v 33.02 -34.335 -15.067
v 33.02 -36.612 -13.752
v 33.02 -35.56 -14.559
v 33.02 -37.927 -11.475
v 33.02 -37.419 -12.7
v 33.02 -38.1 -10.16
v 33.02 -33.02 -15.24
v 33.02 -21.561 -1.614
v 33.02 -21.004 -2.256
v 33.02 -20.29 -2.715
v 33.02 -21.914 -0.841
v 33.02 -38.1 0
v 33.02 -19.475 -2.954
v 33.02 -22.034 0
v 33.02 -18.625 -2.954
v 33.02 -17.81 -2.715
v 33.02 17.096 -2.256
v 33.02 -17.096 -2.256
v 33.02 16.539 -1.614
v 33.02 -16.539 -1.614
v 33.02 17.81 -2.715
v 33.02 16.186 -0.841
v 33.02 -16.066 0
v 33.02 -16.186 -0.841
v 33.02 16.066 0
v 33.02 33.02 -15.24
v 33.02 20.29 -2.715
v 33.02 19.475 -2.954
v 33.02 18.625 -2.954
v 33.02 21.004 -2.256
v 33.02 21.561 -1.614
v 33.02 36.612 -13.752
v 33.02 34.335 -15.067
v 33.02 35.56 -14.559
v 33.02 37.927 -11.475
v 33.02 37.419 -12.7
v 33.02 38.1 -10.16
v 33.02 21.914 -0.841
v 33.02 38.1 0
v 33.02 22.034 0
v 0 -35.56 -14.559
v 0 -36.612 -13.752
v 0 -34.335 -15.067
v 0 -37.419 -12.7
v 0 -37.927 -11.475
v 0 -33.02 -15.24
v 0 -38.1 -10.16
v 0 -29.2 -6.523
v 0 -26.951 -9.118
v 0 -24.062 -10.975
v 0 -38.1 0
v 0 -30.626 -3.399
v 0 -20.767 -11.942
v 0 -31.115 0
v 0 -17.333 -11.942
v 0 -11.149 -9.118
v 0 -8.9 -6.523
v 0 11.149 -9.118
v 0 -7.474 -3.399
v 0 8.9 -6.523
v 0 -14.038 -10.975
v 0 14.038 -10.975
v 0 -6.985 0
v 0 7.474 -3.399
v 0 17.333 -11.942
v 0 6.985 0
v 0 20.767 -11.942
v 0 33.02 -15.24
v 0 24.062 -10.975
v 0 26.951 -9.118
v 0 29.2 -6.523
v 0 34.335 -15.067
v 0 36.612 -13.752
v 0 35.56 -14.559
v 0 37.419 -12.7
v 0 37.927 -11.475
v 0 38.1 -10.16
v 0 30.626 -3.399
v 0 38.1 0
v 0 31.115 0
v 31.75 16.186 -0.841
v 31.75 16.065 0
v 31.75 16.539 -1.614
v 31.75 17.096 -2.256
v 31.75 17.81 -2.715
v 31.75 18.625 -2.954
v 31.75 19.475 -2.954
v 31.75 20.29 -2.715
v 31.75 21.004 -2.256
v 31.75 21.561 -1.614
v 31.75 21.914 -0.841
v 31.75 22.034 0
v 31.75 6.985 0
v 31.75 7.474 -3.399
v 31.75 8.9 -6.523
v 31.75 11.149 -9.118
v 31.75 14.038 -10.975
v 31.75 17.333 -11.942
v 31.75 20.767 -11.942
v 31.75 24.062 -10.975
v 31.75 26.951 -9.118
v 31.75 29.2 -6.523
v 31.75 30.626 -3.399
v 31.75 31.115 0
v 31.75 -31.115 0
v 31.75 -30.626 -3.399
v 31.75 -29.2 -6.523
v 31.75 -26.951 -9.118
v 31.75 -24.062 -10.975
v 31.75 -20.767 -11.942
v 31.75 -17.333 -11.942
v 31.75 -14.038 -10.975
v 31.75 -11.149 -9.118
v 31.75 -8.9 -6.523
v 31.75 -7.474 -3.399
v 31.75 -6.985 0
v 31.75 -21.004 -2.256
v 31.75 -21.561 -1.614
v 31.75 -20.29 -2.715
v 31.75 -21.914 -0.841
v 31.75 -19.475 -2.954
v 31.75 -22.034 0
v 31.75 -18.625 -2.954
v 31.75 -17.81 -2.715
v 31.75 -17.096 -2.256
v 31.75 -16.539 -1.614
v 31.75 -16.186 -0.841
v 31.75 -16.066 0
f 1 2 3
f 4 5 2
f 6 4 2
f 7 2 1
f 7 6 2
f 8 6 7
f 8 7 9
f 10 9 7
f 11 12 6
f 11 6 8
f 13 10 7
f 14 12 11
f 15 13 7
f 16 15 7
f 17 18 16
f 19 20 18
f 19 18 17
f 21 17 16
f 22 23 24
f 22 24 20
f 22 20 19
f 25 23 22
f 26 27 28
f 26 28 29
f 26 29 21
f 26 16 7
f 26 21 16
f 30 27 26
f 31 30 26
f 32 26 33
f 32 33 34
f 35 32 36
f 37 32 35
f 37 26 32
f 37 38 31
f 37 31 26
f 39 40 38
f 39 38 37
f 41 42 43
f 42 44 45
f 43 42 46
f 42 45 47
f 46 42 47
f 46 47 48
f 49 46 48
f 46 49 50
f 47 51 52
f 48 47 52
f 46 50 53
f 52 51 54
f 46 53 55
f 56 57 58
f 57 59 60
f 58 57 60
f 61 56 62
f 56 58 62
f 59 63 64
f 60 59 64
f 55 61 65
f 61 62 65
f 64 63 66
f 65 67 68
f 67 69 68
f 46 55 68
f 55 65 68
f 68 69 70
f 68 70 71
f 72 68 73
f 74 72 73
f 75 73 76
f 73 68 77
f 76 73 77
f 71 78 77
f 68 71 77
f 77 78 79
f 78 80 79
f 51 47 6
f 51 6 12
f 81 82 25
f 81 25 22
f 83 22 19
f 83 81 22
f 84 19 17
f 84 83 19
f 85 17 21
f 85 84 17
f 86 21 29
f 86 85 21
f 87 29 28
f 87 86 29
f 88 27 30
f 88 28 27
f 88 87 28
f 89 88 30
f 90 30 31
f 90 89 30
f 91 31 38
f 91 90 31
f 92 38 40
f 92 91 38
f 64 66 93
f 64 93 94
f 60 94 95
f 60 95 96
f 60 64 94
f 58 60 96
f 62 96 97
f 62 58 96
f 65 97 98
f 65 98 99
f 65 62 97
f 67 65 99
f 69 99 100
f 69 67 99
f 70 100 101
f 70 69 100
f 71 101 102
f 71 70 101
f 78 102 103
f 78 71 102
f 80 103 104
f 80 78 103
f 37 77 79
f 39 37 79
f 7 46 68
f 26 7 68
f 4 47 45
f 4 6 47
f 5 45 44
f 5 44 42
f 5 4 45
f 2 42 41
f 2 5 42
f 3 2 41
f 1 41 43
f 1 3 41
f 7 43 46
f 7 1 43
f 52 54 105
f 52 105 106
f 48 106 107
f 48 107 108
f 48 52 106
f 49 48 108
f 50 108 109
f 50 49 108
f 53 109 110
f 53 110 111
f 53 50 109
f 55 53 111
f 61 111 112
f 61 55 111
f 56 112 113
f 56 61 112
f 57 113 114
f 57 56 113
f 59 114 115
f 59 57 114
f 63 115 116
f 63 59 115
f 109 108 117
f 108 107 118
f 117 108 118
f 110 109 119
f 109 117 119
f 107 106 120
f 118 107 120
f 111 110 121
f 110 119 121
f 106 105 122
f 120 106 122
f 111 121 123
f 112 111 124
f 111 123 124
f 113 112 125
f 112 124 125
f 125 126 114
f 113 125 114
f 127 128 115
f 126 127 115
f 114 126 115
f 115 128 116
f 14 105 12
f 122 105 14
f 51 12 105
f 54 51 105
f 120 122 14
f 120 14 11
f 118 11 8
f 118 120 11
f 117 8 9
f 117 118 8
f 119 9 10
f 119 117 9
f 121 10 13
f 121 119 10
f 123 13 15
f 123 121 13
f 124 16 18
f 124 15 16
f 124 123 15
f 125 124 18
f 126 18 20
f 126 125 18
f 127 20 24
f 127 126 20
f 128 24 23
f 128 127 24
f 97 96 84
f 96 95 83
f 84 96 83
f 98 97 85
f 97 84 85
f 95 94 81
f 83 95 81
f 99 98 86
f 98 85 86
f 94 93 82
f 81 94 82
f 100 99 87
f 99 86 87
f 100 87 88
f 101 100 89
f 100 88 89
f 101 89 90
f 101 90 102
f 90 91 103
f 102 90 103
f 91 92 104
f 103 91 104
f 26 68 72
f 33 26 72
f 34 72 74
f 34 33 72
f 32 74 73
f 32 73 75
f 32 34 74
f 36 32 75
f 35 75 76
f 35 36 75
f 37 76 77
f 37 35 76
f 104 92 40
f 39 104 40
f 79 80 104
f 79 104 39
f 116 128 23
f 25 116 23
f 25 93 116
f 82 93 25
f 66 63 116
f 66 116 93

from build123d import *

# Parameters (mm, degrees)
F0_W     = 76.2
F0_H     = 15.24
F1_DEPTH = 33.02
F2_R     = 12.065
F3_DEPTH = 31.75
F4_R     = 2.9845
F5_DEPTH = 50.8
F6_R     = 5.08


with BuildPart() as f1:
    # F0 (on Right) → F1 (new body)
    with BuildSketch(Plane.YZ):
        with Locations((0, -7.62)):
            Rectangle(F0_W, F0_H)
    extrude(amount=F1_DEPTH)

    # F2 (on Right) → F3 (cut)
    with BuildSketch(Plane.YZ):
        with Locations((19.05, 0)):
            Circle(F2_R)
        with Locations((-19.05, 0)):
            Circle(F2_R)
    extrude(amount=F3_DEPTH, mode=Mode.SUBTRACT)

    # F4 (on Right) → F5 (cut)
    with BuildSketch(Plane.YZ):
        with Locations((19.05, 0)):
            Circle(F4_R)
        with Locations((-19.05, 0)):
            Circle(F4_R)
    extrude(amount=F5_DEPTH, mode=Mode.SUBTRACT)

    # F6
    f6_edges = [f1.edges().sort_by_distance(p)[0] for p in [
        (16.51, -38.1, -15.24),
        (16.51, 38.1, -15.24),
    ]]
    fillet(f6_edges, radius=F6_R)


solid = f1.part
